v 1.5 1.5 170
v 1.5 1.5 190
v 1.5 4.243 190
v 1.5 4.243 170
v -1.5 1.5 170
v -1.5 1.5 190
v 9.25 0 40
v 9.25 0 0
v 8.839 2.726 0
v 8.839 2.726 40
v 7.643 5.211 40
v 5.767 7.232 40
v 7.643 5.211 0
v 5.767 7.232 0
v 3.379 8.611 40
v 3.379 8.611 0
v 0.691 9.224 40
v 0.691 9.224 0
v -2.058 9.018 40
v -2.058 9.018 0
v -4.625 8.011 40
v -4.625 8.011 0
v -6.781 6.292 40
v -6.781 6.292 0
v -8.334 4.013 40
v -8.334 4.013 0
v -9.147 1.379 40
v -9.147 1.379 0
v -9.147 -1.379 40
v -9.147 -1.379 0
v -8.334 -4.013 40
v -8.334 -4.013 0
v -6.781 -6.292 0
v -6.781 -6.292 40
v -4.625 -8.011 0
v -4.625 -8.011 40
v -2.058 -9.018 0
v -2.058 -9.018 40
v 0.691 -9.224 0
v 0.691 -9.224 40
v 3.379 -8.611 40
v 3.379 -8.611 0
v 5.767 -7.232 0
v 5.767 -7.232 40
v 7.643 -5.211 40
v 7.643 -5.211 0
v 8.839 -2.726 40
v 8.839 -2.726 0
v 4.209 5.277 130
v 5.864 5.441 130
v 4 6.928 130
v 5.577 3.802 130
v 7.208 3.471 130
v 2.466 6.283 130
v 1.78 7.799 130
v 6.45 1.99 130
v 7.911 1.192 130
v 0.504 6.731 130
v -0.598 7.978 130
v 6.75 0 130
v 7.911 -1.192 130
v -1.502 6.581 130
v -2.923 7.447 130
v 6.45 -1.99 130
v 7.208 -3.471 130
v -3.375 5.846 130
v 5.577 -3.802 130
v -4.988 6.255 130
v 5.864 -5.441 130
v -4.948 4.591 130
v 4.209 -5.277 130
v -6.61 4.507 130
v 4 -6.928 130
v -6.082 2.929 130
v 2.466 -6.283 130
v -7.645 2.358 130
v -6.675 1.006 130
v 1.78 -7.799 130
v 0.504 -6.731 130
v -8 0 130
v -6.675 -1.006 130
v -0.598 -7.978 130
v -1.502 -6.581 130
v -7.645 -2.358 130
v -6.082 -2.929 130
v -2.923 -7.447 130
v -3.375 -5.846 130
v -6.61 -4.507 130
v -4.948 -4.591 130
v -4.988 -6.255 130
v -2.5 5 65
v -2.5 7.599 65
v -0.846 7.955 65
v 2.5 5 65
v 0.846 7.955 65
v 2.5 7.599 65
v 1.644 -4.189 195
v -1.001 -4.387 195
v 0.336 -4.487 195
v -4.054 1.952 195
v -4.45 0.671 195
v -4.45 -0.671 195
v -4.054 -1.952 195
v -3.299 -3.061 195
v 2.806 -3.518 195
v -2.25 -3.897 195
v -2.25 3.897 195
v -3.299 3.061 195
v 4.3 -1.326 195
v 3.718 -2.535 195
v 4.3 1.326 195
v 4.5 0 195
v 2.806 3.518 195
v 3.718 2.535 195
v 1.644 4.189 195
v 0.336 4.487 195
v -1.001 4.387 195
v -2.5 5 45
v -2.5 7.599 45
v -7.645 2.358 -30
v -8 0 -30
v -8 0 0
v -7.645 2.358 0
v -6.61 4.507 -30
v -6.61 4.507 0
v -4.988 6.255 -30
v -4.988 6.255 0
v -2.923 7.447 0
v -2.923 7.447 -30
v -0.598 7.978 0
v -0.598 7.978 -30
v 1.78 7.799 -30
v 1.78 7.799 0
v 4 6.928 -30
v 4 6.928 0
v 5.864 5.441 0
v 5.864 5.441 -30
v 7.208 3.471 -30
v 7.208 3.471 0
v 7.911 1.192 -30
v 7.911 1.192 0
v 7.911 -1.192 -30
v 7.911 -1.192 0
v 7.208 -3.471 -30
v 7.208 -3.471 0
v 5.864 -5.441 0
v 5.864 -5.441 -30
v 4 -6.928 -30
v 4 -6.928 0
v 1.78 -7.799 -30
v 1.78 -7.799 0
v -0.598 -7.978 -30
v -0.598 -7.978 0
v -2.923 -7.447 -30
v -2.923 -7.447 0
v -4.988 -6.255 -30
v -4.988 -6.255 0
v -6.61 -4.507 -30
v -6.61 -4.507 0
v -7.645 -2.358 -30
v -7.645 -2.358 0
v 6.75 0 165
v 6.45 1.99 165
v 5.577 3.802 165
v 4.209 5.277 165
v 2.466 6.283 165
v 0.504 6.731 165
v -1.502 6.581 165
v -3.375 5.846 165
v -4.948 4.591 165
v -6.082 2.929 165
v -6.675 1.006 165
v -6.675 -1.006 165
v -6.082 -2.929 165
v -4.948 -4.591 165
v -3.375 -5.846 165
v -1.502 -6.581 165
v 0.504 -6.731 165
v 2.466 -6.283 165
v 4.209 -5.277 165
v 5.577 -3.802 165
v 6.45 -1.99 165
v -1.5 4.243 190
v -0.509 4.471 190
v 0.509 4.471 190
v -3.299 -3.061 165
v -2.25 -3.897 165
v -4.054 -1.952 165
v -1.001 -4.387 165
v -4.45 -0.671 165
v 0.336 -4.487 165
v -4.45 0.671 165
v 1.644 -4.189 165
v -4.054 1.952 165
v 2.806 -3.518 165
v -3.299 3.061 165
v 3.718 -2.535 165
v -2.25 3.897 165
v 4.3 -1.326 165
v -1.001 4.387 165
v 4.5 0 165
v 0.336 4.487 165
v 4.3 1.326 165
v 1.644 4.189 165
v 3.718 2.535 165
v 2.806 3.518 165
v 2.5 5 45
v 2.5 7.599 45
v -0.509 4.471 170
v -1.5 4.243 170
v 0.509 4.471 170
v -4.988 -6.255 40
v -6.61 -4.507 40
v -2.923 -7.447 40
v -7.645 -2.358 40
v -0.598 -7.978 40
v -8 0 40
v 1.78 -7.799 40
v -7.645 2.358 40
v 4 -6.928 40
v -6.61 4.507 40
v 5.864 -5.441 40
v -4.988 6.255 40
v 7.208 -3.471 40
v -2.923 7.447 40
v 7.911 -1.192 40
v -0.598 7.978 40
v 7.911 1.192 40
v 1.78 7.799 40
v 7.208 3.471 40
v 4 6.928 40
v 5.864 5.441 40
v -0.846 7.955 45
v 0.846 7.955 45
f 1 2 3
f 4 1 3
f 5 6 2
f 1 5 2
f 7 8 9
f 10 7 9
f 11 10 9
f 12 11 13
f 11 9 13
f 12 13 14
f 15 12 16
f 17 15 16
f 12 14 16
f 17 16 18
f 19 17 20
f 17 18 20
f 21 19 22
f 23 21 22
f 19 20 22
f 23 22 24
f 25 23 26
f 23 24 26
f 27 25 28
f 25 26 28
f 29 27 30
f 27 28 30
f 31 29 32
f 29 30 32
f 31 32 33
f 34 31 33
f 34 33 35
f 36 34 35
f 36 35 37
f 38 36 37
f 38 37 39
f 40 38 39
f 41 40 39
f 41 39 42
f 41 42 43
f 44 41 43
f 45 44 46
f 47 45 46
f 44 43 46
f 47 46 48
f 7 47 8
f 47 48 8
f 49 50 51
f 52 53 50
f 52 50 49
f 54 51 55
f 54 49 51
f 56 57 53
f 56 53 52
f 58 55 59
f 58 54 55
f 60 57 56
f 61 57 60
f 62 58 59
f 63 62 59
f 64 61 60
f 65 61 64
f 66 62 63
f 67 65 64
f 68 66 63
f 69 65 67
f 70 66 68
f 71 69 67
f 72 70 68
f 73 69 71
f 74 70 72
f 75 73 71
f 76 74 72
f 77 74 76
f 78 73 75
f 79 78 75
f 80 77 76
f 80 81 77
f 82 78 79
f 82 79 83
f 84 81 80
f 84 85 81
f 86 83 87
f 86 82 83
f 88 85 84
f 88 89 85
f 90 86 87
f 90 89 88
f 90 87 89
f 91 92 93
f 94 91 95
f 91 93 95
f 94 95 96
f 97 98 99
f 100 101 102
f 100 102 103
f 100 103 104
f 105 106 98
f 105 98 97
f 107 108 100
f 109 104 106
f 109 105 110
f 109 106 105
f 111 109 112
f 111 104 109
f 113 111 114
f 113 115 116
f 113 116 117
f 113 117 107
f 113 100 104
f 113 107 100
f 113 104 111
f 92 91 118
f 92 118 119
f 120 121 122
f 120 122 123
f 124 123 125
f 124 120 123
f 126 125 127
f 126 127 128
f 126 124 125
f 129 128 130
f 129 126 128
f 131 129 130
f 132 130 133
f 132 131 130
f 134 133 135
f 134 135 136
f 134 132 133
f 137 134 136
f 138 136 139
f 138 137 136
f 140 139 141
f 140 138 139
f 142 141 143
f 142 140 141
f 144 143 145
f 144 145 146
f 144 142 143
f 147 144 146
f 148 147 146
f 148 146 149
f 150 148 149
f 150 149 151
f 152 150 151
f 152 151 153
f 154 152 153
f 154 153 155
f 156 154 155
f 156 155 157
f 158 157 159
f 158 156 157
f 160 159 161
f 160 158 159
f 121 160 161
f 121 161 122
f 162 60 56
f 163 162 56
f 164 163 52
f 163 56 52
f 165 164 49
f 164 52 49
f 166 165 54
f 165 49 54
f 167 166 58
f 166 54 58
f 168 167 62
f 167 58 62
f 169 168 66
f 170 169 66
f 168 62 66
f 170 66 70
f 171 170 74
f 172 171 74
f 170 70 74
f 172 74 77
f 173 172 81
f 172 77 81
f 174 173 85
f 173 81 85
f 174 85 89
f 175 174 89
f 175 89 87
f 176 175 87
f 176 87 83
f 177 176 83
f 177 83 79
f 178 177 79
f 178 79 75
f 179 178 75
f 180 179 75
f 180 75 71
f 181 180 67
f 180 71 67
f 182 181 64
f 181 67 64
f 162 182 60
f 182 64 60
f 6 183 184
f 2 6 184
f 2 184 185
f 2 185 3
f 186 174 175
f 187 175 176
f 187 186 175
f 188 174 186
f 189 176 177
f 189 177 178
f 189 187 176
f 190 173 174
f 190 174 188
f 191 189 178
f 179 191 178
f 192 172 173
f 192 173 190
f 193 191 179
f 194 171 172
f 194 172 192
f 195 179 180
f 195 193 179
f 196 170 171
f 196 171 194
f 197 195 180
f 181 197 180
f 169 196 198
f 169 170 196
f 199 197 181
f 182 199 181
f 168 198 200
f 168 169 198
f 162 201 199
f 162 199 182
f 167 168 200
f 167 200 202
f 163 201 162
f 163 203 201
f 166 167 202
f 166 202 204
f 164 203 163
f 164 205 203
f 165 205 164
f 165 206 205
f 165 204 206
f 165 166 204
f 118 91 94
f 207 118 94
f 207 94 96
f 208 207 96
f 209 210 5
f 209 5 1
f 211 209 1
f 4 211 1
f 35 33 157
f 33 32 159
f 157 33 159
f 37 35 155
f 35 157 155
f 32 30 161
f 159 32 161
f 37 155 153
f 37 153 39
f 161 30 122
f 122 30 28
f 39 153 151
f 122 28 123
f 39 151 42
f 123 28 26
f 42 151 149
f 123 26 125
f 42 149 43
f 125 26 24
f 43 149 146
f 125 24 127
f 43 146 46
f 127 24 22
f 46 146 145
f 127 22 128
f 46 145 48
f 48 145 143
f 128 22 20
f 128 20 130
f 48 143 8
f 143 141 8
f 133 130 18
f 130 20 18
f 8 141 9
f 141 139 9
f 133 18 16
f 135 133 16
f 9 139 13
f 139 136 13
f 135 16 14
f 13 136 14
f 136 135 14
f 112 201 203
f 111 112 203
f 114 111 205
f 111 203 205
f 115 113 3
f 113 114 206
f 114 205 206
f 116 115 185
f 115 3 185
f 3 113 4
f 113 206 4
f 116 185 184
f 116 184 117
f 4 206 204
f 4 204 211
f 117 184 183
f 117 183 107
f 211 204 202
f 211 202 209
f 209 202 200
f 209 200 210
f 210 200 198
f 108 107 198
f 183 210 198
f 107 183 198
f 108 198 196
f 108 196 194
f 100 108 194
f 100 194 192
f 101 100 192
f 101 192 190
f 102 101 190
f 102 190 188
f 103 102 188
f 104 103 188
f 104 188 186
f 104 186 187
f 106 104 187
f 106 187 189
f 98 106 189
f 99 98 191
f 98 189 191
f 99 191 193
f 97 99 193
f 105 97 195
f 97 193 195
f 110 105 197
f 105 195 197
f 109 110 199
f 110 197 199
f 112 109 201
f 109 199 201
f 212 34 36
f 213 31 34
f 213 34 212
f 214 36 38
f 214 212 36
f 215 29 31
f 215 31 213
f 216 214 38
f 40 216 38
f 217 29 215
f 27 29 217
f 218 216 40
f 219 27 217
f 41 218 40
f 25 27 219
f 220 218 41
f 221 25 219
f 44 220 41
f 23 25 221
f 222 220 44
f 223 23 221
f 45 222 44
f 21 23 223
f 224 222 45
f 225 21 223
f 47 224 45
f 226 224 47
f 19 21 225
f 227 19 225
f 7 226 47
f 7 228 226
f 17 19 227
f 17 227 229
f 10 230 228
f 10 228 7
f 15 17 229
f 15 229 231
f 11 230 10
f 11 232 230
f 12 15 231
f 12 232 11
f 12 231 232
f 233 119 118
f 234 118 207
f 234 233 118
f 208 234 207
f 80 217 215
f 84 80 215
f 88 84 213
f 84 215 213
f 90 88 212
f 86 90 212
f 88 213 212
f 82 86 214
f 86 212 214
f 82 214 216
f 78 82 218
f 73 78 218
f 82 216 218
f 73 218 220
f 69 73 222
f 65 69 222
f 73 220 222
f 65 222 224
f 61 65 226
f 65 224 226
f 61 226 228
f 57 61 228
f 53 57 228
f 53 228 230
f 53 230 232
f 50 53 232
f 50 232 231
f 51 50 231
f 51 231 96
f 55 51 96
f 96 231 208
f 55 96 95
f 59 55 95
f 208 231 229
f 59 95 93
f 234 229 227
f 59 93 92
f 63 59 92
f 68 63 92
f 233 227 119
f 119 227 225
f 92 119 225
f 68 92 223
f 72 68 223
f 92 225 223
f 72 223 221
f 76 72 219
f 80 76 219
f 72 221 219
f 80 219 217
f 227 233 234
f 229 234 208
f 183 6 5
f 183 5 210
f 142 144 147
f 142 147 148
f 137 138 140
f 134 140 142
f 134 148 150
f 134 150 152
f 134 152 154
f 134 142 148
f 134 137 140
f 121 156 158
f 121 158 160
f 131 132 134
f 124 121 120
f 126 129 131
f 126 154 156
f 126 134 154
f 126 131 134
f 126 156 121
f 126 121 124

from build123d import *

# Parameters (mm, degrees)
SKETCH1_R           = 9.25
BOSS_EXTRUDE1_DEPTH = 40
SKETCH2_R           = 8
BOSS_EXTRUDE2_DEPTH = 90
BOSS_EXTRUDE3_START = 30
SKETCH3_R           = 8
BOSS_EXTRUDE3_DEPTH = 30
SKETCH4_R           = 6.75
BOSS_EXTRUDE4_DEPTH = 35
SKETCH5_R           = 4.5
BOSS_EXTRUDE5_DEPTH = 30
CUT_EXTRUDE1_START  = -5
SKETCH6_W           = 3
SKETCH6_H           = 6
CUT_EXTRUDE1_DEPTH  = 20
CUT_EXTRUDE2_START  = -65
SKETCH7_W           = 5
SKETCH7_H           = 6
CUT_EXTRUDE2_DEPTH  = 20


with BuildPart() as part:
    # Sketch1 → Boss-Extrude1 (new body)
    with BuildSketch(Plane.XY):
        Circle(SKETCH1_R)
    extrude(amount=BOSS_EXTRUDE1_DEPTH)

    # Sketch2 → Boss-Extrude2 (add)
    with BuildSketch(Plane.XY.offset(40)):
        with Locations(Location((0, 0, 0), (0, 0, 180))):
            Circle(SKETCH2_R)
    extrude(amount=BOSS_EXTRUDE2_DEPTH)

    # Sketch3 → Boss-Extrude3 (add)
    with BuildSketch(Plane(origin=(0, 0, 0), x_dir=(-1, 0, 0), z_dir=(0, 0, -1)).offset(BOSS_EXTRUDE3_START)):
        Circle(SKETCH3_R)
    extrude(amount=-BOSS_EXTRUDE3_DEPTH)

    # Sketch4 → Boss-Extrude4 (add)
    with BuildSketch(Plane.XY.offset(130)):
        Circle(SKETCH4_R)
    extrude(amount=BOSS_EXTRUDE4_DEPTH)

    # Sketch5 → Boss-Extrude5 (add)
    with BuildSketch(Plane.XY.offset(165)):
        Circle(SKETCH5_R)
    extrude(amount=BOSS_EXTRUDE5_DEPTH)

    # Sketch6 → Cut-Extrude1 (cut)
    with BuildSketch(Plane.XY.offset(195).offset(CUT_EXTRUDE1_START)):
        with Locations((0, 4.5)):
            Rectangle(SKETCH6_W, SKETCH6_H)
    extrude(amount=-CUT_EXTRUDE1_DEPTH, mode=Mode.SUBTRACT)

    # Sketch7 → Cut-Extrude2 (cut)
    with BuildSketch(Plane.XY.offset(130).offset(CUT_EXTRUDE2_START)):
        with Locations((0, 8)):
            Rectangle(SKETCH7_W, SKETCH7_H)
    extrude(amount=-CUT_EXTRUDE2_DEPTH, mode=Mode.SUBTRACT)


solid = part.part
